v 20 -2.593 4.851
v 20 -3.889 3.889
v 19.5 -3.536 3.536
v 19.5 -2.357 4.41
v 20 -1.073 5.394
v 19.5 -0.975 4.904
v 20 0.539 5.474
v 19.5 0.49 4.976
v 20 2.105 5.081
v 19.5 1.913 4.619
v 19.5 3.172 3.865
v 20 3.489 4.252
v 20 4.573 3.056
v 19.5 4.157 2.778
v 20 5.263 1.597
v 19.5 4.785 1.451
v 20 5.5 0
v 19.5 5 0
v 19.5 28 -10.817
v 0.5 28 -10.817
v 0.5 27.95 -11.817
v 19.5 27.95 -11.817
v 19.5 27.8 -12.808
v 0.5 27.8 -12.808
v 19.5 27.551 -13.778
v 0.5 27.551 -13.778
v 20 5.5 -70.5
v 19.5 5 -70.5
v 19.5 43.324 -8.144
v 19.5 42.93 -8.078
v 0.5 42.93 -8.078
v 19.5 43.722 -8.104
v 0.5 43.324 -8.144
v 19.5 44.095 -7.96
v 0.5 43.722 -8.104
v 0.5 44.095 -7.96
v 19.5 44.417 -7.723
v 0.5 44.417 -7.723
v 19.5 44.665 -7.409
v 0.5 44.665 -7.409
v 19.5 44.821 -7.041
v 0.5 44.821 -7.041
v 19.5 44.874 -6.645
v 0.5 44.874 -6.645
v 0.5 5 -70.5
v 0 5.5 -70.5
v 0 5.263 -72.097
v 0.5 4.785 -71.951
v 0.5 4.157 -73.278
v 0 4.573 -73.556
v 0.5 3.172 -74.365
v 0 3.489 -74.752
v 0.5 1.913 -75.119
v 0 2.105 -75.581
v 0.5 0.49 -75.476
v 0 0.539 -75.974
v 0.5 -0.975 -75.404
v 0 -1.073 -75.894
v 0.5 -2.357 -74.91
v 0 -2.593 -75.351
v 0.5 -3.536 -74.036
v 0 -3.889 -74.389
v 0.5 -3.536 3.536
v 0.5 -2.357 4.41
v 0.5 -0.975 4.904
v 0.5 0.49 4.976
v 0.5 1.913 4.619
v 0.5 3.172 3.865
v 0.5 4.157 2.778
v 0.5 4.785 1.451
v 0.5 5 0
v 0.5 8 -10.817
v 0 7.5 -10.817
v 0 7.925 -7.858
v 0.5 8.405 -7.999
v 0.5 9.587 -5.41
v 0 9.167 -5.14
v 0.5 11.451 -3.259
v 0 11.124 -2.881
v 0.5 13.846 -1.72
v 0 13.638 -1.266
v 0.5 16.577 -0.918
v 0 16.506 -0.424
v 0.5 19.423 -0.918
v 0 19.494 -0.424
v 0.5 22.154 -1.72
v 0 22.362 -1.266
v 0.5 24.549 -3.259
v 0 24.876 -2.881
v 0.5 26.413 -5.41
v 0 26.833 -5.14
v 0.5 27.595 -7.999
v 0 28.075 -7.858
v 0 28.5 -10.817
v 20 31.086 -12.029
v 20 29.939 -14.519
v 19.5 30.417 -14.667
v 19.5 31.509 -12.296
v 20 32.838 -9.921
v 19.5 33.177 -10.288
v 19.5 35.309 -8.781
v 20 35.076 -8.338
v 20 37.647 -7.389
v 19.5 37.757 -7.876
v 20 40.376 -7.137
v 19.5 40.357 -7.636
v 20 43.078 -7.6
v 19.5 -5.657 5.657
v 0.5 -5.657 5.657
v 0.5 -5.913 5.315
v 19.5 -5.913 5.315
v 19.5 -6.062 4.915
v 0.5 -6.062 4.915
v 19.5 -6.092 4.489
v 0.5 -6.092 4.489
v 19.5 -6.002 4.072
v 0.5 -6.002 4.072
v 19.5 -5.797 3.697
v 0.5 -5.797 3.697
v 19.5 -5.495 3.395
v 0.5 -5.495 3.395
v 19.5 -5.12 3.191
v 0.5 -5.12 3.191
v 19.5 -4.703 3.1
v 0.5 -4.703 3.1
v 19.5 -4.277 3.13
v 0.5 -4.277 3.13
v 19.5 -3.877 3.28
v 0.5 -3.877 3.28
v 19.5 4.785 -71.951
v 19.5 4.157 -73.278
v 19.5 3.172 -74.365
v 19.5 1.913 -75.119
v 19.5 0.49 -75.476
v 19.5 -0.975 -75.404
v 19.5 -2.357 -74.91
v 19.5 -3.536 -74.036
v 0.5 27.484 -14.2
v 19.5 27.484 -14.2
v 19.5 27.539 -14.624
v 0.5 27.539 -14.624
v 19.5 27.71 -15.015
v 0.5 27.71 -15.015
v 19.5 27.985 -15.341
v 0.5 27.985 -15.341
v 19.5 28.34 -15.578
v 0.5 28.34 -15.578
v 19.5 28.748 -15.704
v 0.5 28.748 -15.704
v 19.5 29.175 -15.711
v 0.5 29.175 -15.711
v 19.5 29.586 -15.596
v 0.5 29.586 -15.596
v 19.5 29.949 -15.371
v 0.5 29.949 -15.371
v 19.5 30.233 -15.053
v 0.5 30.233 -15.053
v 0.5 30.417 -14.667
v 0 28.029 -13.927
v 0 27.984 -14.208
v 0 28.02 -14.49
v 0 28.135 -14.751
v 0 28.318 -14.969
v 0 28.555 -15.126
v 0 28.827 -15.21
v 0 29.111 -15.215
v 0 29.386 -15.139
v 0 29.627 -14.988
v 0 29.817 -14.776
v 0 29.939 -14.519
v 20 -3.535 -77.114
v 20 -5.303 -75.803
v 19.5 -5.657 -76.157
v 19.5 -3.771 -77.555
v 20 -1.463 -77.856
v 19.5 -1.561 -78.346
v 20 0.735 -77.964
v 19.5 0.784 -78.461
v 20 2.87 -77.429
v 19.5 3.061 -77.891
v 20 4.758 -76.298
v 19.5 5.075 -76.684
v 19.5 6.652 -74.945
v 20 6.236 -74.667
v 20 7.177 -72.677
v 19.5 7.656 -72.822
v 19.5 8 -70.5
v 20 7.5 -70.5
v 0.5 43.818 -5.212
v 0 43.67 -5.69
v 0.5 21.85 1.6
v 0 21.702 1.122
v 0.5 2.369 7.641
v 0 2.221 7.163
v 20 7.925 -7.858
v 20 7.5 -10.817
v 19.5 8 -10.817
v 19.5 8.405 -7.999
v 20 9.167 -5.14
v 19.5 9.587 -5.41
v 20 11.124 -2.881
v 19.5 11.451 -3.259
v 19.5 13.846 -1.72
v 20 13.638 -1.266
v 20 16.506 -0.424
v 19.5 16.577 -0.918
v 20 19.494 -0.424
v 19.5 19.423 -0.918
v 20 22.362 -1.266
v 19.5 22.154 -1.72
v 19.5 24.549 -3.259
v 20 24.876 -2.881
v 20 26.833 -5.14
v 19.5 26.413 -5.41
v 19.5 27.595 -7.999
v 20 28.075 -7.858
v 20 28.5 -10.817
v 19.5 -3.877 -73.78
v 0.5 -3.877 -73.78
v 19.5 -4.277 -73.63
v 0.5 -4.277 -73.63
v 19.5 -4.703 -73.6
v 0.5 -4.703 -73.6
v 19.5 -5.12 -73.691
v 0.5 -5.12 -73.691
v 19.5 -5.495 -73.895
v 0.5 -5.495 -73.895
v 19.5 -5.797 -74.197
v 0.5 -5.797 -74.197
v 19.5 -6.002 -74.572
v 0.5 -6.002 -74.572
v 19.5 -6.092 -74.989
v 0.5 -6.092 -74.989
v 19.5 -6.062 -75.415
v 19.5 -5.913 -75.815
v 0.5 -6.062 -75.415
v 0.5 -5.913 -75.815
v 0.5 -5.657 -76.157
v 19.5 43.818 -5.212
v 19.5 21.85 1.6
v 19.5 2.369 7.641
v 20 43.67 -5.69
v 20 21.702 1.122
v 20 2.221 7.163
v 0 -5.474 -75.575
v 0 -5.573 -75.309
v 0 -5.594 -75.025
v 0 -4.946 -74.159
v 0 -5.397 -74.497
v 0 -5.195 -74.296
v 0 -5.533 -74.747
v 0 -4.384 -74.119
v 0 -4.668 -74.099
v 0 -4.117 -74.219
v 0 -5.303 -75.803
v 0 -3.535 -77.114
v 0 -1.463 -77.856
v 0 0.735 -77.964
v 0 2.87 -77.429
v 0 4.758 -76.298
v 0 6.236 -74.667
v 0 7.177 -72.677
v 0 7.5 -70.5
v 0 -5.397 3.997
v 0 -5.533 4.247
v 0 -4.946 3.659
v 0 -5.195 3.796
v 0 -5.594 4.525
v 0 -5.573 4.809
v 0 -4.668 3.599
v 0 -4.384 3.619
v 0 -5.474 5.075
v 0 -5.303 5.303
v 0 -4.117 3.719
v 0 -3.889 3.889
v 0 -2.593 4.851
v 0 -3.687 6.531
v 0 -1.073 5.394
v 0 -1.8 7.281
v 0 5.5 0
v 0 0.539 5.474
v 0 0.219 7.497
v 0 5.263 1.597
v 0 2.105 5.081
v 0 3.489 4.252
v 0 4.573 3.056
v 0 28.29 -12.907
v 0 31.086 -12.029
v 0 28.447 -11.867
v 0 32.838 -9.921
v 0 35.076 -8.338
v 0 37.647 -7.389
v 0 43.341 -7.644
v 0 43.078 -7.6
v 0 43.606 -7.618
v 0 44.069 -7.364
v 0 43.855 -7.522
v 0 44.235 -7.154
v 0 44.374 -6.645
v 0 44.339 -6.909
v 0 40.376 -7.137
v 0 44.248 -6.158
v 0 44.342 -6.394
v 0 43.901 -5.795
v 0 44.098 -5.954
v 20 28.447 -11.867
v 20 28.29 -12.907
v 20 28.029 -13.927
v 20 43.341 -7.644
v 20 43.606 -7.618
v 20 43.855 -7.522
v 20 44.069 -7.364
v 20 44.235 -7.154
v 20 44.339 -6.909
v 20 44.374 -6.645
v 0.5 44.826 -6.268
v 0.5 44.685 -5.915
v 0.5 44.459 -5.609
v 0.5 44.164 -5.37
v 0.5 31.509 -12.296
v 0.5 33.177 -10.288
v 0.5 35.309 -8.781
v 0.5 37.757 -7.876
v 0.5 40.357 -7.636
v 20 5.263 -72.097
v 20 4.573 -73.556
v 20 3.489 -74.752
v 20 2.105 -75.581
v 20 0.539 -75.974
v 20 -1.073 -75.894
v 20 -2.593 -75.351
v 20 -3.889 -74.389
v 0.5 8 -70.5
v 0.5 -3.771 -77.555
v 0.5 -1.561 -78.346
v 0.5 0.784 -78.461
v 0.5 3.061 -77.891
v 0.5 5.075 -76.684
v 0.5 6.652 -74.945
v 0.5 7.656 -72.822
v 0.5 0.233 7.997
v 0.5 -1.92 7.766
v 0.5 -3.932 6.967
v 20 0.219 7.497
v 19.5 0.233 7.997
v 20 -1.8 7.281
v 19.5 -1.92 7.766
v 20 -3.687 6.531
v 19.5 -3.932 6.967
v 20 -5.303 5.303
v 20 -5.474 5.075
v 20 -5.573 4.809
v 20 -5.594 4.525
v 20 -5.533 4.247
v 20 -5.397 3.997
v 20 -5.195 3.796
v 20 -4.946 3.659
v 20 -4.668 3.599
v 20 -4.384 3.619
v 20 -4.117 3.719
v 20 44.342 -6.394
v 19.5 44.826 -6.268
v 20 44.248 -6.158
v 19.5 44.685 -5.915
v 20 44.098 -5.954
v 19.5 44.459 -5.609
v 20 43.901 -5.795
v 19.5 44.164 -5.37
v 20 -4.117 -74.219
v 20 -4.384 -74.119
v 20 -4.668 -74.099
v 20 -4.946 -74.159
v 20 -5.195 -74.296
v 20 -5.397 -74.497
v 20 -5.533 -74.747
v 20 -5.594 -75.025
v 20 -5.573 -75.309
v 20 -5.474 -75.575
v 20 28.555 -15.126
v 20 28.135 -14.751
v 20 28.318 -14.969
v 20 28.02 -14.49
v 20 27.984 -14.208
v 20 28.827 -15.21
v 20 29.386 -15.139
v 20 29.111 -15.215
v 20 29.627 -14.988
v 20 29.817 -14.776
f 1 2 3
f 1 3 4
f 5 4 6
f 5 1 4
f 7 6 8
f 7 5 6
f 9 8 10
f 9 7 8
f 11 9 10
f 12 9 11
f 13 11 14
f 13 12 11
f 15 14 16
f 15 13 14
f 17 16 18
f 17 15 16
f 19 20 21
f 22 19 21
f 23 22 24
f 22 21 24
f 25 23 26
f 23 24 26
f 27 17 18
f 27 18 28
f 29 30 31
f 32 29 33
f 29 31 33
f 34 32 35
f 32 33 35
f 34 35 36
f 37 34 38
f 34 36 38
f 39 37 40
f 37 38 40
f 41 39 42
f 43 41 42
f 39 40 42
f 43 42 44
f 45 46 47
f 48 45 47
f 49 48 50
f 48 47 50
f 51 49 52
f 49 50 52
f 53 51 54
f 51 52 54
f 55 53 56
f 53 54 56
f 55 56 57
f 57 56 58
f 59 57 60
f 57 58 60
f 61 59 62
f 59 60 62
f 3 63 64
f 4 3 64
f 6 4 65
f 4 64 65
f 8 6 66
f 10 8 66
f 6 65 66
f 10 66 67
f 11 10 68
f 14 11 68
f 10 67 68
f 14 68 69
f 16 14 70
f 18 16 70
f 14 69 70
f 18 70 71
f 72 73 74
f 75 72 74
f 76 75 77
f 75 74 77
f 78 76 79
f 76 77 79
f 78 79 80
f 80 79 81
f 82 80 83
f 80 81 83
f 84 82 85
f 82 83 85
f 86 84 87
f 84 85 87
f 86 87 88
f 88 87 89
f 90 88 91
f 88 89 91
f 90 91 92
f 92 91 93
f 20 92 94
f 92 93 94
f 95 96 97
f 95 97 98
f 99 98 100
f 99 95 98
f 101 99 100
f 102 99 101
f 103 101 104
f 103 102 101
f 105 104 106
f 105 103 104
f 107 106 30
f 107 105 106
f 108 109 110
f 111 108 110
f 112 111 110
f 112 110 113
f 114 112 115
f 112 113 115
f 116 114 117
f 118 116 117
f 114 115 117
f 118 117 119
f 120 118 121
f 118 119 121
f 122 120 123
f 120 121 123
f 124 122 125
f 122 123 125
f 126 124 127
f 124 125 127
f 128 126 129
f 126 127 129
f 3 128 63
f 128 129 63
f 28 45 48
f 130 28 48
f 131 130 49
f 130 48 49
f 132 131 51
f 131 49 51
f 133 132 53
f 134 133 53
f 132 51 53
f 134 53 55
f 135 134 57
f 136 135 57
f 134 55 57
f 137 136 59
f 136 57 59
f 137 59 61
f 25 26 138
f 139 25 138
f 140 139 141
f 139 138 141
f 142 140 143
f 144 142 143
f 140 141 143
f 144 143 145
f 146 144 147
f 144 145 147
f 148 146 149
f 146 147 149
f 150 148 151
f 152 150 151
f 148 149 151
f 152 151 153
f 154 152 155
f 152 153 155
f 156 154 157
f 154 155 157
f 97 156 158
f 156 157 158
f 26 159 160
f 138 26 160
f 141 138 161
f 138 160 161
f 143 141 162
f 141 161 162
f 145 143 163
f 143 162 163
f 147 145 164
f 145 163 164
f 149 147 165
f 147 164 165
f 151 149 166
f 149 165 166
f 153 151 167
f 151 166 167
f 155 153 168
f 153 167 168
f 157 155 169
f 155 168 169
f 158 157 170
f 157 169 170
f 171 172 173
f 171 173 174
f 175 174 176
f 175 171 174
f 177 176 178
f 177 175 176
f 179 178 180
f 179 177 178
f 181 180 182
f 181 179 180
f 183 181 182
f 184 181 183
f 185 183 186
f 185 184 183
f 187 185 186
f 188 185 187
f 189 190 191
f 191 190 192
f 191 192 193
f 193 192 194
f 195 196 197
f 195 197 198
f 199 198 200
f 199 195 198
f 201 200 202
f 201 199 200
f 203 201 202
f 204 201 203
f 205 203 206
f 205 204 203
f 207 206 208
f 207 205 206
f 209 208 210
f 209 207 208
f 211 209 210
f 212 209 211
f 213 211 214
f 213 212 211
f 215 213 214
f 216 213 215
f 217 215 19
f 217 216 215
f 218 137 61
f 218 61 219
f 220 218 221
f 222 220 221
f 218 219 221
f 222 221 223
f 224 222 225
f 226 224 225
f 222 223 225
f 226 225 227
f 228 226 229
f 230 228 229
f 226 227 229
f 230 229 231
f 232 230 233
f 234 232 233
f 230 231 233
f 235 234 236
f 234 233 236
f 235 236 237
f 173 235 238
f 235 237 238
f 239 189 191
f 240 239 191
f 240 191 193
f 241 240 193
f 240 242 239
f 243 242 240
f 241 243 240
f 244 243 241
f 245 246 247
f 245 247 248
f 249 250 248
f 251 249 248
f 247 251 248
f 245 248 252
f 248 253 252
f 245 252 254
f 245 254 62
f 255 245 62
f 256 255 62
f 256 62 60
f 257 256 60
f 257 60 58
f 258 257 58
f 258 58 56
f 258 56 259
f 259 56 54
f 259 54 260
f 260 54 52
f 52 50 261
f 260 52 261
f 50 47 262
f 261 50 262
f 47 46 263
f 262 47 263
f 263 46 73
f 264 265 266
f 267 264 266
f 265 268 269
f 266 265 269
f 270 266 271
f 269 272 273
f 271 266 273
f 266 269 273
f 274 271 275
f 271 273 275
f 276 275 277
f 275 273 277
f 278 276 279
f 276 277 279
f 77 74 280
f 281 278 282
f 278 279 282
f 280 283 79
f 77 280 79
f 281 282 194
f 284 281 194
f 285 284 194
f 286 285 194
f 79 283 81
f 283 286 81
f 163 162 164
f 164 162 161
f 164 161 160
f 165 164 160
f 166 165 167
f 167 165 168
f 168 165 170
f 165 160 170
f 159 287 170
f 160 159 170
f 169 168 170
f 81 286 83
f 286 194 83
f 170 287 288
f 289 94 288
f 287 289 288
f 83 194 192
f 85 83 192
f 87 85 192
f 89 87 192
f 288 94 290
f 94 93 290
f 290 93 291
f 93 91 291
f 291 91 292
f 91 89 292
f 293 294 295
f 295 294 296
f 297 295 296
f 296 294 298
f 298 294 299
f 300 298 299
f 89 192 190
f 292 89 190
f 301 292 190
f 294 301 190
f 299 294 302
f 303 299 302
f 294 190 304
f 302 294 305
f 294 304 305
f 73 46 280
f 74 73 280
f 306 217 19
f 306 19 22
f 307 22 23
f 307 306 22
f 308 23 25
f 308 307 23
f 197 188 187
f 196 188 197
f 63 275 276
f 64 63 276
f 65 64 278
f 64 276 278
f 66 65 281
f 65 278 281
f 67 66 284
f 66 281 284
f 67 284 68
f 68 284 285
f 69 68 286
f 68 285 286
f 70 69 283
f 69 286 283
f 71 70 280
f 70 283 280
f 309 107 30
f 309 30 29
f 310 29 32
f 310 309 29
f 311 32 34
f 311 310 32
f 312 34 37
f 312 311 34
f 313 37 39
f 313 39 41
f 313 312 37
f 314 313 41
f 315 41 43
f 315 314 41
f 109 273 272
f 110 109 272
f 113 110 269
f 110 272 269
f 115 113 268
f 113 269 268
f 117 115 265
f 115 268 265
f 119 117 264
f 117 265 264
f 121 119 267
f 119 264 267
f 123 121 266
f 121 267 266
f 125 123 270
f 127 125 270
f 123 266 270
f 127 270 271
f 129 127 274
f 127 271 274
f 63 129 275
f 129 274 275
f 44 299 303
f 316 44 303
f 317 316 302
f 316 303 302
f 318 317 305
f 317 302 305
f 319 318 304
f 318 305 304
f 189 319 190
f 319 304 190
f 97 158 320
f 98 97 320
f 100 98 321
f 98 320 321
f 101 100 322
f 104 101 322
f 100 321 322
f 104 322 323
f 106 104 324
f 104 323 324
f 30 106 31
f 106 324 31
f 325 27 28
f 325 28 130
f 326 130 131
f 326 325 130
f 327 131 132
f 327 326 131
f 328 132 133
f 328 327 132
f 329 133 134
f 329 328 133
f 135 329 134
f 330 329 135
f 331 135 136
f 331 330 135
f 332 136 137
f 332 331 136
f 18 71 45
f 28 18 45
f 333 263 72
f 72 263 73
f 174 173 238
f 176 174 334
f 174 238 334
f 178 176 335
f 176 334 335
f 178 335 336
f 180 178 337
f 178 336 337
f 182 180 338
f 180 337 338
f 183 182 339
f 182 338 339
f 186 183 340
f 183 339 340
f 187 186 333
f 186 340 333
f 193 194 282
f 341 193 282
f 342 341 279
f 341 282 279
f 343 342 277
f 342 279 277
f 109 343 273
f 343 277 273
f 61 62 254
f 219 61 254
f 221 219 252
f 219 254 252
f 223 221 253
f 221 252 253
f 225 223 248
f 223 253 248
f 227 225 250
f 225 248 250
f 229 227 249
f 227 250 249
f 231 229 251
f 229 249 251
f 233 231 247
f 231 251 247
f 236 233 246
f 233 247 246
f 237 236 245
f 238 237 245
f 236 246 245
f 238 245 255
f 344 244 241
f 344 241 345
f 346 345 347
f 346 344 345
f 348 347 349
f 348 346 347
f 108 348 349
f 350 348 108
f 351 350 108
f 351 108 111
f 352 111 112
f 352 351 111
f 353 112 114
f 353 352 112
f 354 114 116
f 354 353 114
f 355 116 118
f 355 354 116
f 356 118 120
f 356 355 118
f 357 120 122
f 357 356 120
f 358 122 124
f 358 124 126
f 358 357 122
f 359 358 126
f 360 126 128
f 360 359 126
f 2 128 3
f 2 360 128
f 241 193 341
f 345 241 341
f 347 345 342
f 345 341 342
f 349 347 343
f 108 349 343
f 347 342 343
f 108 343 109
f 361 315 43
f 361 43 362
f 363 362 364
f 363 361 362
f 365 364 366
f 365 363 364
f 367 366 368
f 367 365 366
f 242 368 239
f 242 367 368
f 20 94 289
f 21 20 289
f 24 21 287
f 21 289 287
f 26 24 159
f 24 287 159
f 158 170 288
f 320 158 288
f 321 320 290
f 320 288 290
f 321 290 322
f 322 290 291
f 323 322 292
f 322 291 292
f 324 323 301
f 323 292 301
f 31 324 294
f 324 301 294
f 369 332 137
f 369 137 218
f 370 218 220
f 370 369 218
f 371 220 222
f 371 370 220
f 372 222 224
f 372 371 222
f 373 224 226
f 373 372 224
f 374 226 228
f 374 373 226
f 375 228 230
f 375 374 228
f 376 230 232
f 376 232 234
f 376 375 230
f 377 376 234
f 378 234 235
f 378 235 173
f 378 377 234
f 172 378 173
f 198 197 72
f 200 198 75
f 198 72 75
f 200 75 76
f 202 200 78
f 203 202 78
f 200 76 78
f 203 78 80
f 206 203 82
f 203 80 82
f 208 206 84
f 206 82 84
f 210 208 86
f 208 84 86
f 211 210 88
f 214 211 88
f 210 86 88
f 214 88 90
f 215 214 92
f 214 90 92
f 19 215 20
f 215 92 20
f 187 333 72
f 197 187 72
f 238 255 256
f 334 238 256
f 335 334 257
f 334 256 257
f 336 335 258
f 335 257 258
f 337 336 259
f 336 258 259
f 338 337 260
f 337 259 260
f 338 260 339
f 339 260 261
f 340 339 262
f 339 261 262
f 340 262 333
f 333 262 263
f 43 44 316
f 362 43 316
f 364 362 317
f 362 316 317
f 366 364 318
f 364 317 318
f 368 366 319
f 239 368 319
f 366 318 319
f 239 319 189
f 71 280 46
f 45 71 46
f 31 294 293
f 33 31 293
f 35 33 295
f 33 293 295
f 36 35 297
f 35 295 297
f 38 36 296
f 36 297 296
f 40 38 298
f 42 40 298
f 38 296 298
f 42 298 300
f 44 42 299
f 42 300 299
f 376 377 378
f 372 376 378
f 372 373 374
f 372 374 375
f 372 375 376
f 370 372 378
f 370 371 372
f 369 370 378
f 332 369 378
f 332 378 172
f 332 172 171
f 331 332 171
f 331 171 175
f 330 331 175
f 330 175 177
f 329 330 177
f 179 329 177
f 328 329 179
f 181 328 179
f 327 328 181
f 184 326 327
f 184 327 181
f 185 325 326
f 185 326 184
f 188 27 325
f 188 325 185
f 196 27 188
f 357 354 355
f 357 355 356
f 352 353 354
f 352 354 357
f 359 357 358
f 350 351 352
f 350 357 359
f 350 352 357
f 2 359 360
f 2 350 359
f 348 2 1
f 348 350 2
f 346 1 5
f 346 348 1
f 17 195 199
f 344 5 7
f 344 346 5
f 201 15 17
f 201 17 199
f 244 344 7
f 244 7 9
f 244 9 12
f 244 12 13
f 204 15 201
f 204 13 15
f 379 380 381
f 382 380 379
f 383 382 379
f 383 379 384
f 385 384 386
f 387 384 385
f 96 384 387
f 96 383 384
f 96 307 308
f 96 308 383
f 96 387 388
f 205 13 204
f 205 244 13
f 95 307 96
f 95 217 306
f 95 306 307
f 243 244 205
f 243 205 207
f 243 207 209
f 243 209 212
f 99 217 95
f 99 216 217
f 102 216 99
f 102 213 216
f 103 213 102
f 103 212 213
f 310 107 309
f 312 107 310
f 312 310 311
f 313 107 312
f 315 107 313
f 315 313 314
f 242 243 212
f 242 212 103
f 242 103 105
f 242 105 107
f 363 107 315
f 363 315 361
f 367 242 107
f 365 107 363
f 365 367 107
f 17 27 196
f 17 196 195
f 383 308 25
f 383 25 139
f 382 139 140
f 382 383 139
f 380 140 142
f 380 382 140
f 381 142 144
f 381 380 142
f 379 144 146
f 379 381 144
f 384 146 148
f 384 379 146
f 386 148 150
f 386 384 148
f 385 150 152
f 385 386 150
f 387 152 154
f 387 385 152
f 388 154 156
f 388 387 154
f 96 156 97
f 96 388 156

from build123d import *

# Parameters (mm, degrees)
F1_DEPTH = 20
F2_SIZE  = 0.5


with BuildPart() as f1:
    # F0 (on Right) → F1 (new body)
    with BuildSketch(Plane.YZ):
        with BuildLine():
            ThreePointArc((8, -2.5100299635), (7.3979430927, -3.2935966464), (6.8571428166, -4.1206300966))
            ThreePointArc((6.8571428166, -4.1206300966), (5.4728865379, -7.3422577195), (5, -10.8166538264))
            ThreePointArc((5, -10.8166538264), (5.7729807394, -15.2325342596), (8, -19.1232776893))
            Line((8, -19.1232776893), (8, -10.8166538264))
            Line((8, -10.8166538264), (8, -2.5100299635))
        make_face()
        with BuildLine():
            ThreePointArc((-3.5355339038, 3.5355339081), (1.9134171632, 4.619397662), (5, 0))
            Line((5, 0), (5, -6.2449979984))
            ThreePointArc((5, -6.2449979984), (6.022972164, -5.2653400945), (6.8571428166, -4.1206300966))
            ThreePointArc((6.8571428166, -4.1206300966), (7.7089928828, -2.1380899732), (8, 0))
            ThreePointArc((8, 0), (6.4403338781, 4.7457454145), (2.3694751153, 7.6410462424))
            ThreePointArc((2.3694751153, 7.6410462424), (-1.9198879809, 7.7662107968), (-5.6568542495, 5.6568542495))
            ThreePointArc((-5.6568542495, 5.6568542495), (-4.0221689292, 5.9820133765), (-3.0961940777, 4.5961940777))
            ThreePointArc((-3.0961940777, 4.5961940777), (-3.2103747784, 4.0221689306), (-3.5355339038, 3.5355339081))
        make_face()
        with BuildLine():
            ThreePointArc((-5.6568542495, 5.6568542495), (-5.6568542484, 3.5355339049), (-3.5355339038, 3.5355339081))
            ThreePointArc((-3.5355339038, 3.5355339081), (-3.2103747784, 4.0221689306), (-3.0961940777, 4.5961940777))
            ThreePointArc((-3.0961940777, 4.5961940777), (-4.0221689292, 5.9820133765), (-5.6568542495, 5.6568542495))
        make_face()
        with BuildLine():
            ThreePointArc((8, -70.5), (7.2111025509, -67.0358983849), (5, -64.2550020016))
            Line((5, -64.2550020016), (5, -70.5))
            ThreePointArc((5, -70.5), (1.91341718, -75.119397655), (-3.5355338781, -74.0355339338))
            ThreePointArc((-3.5355338781, -74.0355339338), (-3.2103747714, -74.5221689473), (-3.0961940777, -75.0961940777))
            ThreePointArc((-3.0961940777, -75.0961940777), (-4.0221689259, -76.4820133751), (-5.6568542445, -76.1568542545))
            ThreePointArc((-5.6568542445, -76.1568542545), (3.0614674622, -77.8910362587), (8, -70.5))
        make_face()
        with BuildLine():
            ThreePointArc((-3.5355338781, -74.0355339338), (-5.6568542381, -74.0355338945), (-5.6568542445, -76.1568542545))
            ThreePointArc((-5.6568542445, -76.1568542545), (-4.0221689259, -76.4820133751), (-3.0961940777, -75.0961940777))
            ThreePointArc((-3.0961940777, -75.0961940777), (-3.2103747714, -74.5221689473), (-3.5355338781, -74.0355339338))
        make_face()
        with BuildLine():
            ThreePointArc((6.8571428166, -4.1206300966), (6.022972164, -5.2653400945), (5, -6.2449979984))
            Line((5, -6.2449979984), (5, -10.8166538264))
            ThreePointArc((5, -10.8166538264), (5.4728865379, -7.3422577195), (6.8571428166, -4.1206300966))
        make_face()
        with BuildLine():
            ThreePointArc((21.8503970623, 1.6000463175), (14.3016779708, 1.6461875097), (8, -2.5100299635))
            Line((8, -2.5100299635), (8, -10.8166538264))
            ThreePointArc((8, -10.8166538264), (18, -0.8166538264), (28, -10.8166538264))
            ThreePointArc((28, -10.8166538264), (27.8871906481, -12.3144726031), (27.5513077824, -13.7784977868))
            ThreePointArc((27.5513077824, -13.7784977868), (29.2086767505, -12.7396957014), (30.4840039734, -14.2227743046))
            ThreePointArc((30.4840039734, -14.2227743046), (30.4670825809, -14.4474470536), (30.4167001812, -14.6670507681))
            ThreePointArc((30.4167001812, -14.6670507681), (30.8533478588, -12.7638181291), (31, -10.8166538264))
            ThreePointArc((31, -10.8166538264), (28.4655425519, -3.1048175279), (21.8503970623, 1.6000463175))
        make_face()
        with BuildLine():
            ThreePointArc((27.5513077824, -13.7784977868), (28.5397274827, -15.655470504), (30.4167001812, -14.6670507681))
            ThreePointArc((30.4167001812, -14.6670507681), (30.4670825809, -14.4474470536), (30.4840039734, -14.2227743046))
            ThreePointArc((30.4840039734, -14.2227743046), (29.2086767505, -12.7396957014), (27.5513077824, -13.7784977868))
        make_face()
        with BuildLine():
            ThreePointArc((8, 0), (7.7089928828, -2.1380899732), (6.8571428166, -4.1206300966))
            ThreePointArc((6.8571428166, -4.1206300966), (7.3979430927, -3.2935966464), (8, -2.5100299635))
            Line((8, -2.5100299635), (8, 0))
        make_face()
        with BuildLine():
            ThreePointArc((8, -19.1232776893), (5.7729807394, -15.2325342596), (5, -10.8166538264))
            Line((5, -10.8166538264), (5, -64.2550020016))
            ThreePointArc((5, -64.2550020016), (7.2111025509, -67.0358983849), (8, -70.5))
            Line((8, -70.5), (8, -19.1232776893))
        make_face()
        with BuildLine():
            Line((21.8503970623, 1.6000463175), (2.3694751153, 7.6410462424))
            ThreePointArc((2.3694751153, 7.6410462424), (6.4403338781, 4.7457454145), (8, 0))
            Line((8, 0), (8, -2.5100299635))
            ThreePointArc((8, -2.5100299635), (14.3016779708, 1.6461875097), (21.8503970623, 1.6000463175))
        make_face()
        with BuildLine():
            Line((43.8184051491, -5.2121946824), (21.8503970623, 1.6000463175))
            ThreePointArc((21.8503970623, 1.6000463175), (28.4655425519, -3.1048175279), (31, -10.8166538264))
            ThreePointArc((31, -10.8166538264), (30.8533478588, -12.7638181291), (30.4167001812, -14.6670507681))
            ThreePointArc((30.4167001812, -14.6670507681), (35.3085533829, -8.7807603373), (42.9298518292, -8.0775869762))
            ThreePointArc((42.9298518292, -8.0775869762), (41.9414322781, -6.2006141495), (43.8184051491, -5.2121946824))
        make_face()
        with BuildLine():
            ThreePointArc((44.874128425, -6.6448908094), (44.5816910706, -5.7550636032), (43.8184051491, -5.2121946824))
            ThreePointArc((43.8184051491, -5.2121946824), (41.9414322781, -6.2006141495), (42.9298518292, -8.0775869762))
            ThreePointArc((42.9298518292, -8.0775869762), (44.2639556853, -7.8524534152), (44.874128425, -6.6448908094))
        make_face()
    extrude(amount=F1_DEPTH)

    # F2
    f2_edges = [f1.edges().sort_by_distance(p)[0] for p in [
        (20, -1.919888, 7.766211),
        (20, -5.656854, 3.535534),
        (20, 1.913417, 4.619398),
        (20, 5, -35.25),
        (20, 1.913417, -75.119398),
        (20, -5.656854, -74.035534),
        (20, 3.061467, -77.891036),
        (20, 8, -40.658327),
        (20, 19.497819, -0.929463),
        (20, 28.539727, -15.655471),
        (20, 35.308553, -8.78076),
        (20, 44.806825, -7.089167),
        (20, 23.09394, 1.214426),
        (0, -1.919888, 7.766211),
        (0, -5.656854, 3.535534),
        (0, 1.913417, 4.619398),
        (0, 5, -35.25),
        (0, 1.913417, -75.119398),
        (0, -5.656854, -74.035534),
        (0, 3.061467, -77.891036),
        (0, 8, -40.658327),
        (0, 19.497819, -0.929463),
        (0, 28.539727, -15.655471),
        (0, 35.308553, -8.78076),
        (0, 44.806825, -7.089167),
        (0, 23.09394, 1.214426),
    ]]
    chamfer(f2_edges, length=F2_SIZE)


solid = f1.part
